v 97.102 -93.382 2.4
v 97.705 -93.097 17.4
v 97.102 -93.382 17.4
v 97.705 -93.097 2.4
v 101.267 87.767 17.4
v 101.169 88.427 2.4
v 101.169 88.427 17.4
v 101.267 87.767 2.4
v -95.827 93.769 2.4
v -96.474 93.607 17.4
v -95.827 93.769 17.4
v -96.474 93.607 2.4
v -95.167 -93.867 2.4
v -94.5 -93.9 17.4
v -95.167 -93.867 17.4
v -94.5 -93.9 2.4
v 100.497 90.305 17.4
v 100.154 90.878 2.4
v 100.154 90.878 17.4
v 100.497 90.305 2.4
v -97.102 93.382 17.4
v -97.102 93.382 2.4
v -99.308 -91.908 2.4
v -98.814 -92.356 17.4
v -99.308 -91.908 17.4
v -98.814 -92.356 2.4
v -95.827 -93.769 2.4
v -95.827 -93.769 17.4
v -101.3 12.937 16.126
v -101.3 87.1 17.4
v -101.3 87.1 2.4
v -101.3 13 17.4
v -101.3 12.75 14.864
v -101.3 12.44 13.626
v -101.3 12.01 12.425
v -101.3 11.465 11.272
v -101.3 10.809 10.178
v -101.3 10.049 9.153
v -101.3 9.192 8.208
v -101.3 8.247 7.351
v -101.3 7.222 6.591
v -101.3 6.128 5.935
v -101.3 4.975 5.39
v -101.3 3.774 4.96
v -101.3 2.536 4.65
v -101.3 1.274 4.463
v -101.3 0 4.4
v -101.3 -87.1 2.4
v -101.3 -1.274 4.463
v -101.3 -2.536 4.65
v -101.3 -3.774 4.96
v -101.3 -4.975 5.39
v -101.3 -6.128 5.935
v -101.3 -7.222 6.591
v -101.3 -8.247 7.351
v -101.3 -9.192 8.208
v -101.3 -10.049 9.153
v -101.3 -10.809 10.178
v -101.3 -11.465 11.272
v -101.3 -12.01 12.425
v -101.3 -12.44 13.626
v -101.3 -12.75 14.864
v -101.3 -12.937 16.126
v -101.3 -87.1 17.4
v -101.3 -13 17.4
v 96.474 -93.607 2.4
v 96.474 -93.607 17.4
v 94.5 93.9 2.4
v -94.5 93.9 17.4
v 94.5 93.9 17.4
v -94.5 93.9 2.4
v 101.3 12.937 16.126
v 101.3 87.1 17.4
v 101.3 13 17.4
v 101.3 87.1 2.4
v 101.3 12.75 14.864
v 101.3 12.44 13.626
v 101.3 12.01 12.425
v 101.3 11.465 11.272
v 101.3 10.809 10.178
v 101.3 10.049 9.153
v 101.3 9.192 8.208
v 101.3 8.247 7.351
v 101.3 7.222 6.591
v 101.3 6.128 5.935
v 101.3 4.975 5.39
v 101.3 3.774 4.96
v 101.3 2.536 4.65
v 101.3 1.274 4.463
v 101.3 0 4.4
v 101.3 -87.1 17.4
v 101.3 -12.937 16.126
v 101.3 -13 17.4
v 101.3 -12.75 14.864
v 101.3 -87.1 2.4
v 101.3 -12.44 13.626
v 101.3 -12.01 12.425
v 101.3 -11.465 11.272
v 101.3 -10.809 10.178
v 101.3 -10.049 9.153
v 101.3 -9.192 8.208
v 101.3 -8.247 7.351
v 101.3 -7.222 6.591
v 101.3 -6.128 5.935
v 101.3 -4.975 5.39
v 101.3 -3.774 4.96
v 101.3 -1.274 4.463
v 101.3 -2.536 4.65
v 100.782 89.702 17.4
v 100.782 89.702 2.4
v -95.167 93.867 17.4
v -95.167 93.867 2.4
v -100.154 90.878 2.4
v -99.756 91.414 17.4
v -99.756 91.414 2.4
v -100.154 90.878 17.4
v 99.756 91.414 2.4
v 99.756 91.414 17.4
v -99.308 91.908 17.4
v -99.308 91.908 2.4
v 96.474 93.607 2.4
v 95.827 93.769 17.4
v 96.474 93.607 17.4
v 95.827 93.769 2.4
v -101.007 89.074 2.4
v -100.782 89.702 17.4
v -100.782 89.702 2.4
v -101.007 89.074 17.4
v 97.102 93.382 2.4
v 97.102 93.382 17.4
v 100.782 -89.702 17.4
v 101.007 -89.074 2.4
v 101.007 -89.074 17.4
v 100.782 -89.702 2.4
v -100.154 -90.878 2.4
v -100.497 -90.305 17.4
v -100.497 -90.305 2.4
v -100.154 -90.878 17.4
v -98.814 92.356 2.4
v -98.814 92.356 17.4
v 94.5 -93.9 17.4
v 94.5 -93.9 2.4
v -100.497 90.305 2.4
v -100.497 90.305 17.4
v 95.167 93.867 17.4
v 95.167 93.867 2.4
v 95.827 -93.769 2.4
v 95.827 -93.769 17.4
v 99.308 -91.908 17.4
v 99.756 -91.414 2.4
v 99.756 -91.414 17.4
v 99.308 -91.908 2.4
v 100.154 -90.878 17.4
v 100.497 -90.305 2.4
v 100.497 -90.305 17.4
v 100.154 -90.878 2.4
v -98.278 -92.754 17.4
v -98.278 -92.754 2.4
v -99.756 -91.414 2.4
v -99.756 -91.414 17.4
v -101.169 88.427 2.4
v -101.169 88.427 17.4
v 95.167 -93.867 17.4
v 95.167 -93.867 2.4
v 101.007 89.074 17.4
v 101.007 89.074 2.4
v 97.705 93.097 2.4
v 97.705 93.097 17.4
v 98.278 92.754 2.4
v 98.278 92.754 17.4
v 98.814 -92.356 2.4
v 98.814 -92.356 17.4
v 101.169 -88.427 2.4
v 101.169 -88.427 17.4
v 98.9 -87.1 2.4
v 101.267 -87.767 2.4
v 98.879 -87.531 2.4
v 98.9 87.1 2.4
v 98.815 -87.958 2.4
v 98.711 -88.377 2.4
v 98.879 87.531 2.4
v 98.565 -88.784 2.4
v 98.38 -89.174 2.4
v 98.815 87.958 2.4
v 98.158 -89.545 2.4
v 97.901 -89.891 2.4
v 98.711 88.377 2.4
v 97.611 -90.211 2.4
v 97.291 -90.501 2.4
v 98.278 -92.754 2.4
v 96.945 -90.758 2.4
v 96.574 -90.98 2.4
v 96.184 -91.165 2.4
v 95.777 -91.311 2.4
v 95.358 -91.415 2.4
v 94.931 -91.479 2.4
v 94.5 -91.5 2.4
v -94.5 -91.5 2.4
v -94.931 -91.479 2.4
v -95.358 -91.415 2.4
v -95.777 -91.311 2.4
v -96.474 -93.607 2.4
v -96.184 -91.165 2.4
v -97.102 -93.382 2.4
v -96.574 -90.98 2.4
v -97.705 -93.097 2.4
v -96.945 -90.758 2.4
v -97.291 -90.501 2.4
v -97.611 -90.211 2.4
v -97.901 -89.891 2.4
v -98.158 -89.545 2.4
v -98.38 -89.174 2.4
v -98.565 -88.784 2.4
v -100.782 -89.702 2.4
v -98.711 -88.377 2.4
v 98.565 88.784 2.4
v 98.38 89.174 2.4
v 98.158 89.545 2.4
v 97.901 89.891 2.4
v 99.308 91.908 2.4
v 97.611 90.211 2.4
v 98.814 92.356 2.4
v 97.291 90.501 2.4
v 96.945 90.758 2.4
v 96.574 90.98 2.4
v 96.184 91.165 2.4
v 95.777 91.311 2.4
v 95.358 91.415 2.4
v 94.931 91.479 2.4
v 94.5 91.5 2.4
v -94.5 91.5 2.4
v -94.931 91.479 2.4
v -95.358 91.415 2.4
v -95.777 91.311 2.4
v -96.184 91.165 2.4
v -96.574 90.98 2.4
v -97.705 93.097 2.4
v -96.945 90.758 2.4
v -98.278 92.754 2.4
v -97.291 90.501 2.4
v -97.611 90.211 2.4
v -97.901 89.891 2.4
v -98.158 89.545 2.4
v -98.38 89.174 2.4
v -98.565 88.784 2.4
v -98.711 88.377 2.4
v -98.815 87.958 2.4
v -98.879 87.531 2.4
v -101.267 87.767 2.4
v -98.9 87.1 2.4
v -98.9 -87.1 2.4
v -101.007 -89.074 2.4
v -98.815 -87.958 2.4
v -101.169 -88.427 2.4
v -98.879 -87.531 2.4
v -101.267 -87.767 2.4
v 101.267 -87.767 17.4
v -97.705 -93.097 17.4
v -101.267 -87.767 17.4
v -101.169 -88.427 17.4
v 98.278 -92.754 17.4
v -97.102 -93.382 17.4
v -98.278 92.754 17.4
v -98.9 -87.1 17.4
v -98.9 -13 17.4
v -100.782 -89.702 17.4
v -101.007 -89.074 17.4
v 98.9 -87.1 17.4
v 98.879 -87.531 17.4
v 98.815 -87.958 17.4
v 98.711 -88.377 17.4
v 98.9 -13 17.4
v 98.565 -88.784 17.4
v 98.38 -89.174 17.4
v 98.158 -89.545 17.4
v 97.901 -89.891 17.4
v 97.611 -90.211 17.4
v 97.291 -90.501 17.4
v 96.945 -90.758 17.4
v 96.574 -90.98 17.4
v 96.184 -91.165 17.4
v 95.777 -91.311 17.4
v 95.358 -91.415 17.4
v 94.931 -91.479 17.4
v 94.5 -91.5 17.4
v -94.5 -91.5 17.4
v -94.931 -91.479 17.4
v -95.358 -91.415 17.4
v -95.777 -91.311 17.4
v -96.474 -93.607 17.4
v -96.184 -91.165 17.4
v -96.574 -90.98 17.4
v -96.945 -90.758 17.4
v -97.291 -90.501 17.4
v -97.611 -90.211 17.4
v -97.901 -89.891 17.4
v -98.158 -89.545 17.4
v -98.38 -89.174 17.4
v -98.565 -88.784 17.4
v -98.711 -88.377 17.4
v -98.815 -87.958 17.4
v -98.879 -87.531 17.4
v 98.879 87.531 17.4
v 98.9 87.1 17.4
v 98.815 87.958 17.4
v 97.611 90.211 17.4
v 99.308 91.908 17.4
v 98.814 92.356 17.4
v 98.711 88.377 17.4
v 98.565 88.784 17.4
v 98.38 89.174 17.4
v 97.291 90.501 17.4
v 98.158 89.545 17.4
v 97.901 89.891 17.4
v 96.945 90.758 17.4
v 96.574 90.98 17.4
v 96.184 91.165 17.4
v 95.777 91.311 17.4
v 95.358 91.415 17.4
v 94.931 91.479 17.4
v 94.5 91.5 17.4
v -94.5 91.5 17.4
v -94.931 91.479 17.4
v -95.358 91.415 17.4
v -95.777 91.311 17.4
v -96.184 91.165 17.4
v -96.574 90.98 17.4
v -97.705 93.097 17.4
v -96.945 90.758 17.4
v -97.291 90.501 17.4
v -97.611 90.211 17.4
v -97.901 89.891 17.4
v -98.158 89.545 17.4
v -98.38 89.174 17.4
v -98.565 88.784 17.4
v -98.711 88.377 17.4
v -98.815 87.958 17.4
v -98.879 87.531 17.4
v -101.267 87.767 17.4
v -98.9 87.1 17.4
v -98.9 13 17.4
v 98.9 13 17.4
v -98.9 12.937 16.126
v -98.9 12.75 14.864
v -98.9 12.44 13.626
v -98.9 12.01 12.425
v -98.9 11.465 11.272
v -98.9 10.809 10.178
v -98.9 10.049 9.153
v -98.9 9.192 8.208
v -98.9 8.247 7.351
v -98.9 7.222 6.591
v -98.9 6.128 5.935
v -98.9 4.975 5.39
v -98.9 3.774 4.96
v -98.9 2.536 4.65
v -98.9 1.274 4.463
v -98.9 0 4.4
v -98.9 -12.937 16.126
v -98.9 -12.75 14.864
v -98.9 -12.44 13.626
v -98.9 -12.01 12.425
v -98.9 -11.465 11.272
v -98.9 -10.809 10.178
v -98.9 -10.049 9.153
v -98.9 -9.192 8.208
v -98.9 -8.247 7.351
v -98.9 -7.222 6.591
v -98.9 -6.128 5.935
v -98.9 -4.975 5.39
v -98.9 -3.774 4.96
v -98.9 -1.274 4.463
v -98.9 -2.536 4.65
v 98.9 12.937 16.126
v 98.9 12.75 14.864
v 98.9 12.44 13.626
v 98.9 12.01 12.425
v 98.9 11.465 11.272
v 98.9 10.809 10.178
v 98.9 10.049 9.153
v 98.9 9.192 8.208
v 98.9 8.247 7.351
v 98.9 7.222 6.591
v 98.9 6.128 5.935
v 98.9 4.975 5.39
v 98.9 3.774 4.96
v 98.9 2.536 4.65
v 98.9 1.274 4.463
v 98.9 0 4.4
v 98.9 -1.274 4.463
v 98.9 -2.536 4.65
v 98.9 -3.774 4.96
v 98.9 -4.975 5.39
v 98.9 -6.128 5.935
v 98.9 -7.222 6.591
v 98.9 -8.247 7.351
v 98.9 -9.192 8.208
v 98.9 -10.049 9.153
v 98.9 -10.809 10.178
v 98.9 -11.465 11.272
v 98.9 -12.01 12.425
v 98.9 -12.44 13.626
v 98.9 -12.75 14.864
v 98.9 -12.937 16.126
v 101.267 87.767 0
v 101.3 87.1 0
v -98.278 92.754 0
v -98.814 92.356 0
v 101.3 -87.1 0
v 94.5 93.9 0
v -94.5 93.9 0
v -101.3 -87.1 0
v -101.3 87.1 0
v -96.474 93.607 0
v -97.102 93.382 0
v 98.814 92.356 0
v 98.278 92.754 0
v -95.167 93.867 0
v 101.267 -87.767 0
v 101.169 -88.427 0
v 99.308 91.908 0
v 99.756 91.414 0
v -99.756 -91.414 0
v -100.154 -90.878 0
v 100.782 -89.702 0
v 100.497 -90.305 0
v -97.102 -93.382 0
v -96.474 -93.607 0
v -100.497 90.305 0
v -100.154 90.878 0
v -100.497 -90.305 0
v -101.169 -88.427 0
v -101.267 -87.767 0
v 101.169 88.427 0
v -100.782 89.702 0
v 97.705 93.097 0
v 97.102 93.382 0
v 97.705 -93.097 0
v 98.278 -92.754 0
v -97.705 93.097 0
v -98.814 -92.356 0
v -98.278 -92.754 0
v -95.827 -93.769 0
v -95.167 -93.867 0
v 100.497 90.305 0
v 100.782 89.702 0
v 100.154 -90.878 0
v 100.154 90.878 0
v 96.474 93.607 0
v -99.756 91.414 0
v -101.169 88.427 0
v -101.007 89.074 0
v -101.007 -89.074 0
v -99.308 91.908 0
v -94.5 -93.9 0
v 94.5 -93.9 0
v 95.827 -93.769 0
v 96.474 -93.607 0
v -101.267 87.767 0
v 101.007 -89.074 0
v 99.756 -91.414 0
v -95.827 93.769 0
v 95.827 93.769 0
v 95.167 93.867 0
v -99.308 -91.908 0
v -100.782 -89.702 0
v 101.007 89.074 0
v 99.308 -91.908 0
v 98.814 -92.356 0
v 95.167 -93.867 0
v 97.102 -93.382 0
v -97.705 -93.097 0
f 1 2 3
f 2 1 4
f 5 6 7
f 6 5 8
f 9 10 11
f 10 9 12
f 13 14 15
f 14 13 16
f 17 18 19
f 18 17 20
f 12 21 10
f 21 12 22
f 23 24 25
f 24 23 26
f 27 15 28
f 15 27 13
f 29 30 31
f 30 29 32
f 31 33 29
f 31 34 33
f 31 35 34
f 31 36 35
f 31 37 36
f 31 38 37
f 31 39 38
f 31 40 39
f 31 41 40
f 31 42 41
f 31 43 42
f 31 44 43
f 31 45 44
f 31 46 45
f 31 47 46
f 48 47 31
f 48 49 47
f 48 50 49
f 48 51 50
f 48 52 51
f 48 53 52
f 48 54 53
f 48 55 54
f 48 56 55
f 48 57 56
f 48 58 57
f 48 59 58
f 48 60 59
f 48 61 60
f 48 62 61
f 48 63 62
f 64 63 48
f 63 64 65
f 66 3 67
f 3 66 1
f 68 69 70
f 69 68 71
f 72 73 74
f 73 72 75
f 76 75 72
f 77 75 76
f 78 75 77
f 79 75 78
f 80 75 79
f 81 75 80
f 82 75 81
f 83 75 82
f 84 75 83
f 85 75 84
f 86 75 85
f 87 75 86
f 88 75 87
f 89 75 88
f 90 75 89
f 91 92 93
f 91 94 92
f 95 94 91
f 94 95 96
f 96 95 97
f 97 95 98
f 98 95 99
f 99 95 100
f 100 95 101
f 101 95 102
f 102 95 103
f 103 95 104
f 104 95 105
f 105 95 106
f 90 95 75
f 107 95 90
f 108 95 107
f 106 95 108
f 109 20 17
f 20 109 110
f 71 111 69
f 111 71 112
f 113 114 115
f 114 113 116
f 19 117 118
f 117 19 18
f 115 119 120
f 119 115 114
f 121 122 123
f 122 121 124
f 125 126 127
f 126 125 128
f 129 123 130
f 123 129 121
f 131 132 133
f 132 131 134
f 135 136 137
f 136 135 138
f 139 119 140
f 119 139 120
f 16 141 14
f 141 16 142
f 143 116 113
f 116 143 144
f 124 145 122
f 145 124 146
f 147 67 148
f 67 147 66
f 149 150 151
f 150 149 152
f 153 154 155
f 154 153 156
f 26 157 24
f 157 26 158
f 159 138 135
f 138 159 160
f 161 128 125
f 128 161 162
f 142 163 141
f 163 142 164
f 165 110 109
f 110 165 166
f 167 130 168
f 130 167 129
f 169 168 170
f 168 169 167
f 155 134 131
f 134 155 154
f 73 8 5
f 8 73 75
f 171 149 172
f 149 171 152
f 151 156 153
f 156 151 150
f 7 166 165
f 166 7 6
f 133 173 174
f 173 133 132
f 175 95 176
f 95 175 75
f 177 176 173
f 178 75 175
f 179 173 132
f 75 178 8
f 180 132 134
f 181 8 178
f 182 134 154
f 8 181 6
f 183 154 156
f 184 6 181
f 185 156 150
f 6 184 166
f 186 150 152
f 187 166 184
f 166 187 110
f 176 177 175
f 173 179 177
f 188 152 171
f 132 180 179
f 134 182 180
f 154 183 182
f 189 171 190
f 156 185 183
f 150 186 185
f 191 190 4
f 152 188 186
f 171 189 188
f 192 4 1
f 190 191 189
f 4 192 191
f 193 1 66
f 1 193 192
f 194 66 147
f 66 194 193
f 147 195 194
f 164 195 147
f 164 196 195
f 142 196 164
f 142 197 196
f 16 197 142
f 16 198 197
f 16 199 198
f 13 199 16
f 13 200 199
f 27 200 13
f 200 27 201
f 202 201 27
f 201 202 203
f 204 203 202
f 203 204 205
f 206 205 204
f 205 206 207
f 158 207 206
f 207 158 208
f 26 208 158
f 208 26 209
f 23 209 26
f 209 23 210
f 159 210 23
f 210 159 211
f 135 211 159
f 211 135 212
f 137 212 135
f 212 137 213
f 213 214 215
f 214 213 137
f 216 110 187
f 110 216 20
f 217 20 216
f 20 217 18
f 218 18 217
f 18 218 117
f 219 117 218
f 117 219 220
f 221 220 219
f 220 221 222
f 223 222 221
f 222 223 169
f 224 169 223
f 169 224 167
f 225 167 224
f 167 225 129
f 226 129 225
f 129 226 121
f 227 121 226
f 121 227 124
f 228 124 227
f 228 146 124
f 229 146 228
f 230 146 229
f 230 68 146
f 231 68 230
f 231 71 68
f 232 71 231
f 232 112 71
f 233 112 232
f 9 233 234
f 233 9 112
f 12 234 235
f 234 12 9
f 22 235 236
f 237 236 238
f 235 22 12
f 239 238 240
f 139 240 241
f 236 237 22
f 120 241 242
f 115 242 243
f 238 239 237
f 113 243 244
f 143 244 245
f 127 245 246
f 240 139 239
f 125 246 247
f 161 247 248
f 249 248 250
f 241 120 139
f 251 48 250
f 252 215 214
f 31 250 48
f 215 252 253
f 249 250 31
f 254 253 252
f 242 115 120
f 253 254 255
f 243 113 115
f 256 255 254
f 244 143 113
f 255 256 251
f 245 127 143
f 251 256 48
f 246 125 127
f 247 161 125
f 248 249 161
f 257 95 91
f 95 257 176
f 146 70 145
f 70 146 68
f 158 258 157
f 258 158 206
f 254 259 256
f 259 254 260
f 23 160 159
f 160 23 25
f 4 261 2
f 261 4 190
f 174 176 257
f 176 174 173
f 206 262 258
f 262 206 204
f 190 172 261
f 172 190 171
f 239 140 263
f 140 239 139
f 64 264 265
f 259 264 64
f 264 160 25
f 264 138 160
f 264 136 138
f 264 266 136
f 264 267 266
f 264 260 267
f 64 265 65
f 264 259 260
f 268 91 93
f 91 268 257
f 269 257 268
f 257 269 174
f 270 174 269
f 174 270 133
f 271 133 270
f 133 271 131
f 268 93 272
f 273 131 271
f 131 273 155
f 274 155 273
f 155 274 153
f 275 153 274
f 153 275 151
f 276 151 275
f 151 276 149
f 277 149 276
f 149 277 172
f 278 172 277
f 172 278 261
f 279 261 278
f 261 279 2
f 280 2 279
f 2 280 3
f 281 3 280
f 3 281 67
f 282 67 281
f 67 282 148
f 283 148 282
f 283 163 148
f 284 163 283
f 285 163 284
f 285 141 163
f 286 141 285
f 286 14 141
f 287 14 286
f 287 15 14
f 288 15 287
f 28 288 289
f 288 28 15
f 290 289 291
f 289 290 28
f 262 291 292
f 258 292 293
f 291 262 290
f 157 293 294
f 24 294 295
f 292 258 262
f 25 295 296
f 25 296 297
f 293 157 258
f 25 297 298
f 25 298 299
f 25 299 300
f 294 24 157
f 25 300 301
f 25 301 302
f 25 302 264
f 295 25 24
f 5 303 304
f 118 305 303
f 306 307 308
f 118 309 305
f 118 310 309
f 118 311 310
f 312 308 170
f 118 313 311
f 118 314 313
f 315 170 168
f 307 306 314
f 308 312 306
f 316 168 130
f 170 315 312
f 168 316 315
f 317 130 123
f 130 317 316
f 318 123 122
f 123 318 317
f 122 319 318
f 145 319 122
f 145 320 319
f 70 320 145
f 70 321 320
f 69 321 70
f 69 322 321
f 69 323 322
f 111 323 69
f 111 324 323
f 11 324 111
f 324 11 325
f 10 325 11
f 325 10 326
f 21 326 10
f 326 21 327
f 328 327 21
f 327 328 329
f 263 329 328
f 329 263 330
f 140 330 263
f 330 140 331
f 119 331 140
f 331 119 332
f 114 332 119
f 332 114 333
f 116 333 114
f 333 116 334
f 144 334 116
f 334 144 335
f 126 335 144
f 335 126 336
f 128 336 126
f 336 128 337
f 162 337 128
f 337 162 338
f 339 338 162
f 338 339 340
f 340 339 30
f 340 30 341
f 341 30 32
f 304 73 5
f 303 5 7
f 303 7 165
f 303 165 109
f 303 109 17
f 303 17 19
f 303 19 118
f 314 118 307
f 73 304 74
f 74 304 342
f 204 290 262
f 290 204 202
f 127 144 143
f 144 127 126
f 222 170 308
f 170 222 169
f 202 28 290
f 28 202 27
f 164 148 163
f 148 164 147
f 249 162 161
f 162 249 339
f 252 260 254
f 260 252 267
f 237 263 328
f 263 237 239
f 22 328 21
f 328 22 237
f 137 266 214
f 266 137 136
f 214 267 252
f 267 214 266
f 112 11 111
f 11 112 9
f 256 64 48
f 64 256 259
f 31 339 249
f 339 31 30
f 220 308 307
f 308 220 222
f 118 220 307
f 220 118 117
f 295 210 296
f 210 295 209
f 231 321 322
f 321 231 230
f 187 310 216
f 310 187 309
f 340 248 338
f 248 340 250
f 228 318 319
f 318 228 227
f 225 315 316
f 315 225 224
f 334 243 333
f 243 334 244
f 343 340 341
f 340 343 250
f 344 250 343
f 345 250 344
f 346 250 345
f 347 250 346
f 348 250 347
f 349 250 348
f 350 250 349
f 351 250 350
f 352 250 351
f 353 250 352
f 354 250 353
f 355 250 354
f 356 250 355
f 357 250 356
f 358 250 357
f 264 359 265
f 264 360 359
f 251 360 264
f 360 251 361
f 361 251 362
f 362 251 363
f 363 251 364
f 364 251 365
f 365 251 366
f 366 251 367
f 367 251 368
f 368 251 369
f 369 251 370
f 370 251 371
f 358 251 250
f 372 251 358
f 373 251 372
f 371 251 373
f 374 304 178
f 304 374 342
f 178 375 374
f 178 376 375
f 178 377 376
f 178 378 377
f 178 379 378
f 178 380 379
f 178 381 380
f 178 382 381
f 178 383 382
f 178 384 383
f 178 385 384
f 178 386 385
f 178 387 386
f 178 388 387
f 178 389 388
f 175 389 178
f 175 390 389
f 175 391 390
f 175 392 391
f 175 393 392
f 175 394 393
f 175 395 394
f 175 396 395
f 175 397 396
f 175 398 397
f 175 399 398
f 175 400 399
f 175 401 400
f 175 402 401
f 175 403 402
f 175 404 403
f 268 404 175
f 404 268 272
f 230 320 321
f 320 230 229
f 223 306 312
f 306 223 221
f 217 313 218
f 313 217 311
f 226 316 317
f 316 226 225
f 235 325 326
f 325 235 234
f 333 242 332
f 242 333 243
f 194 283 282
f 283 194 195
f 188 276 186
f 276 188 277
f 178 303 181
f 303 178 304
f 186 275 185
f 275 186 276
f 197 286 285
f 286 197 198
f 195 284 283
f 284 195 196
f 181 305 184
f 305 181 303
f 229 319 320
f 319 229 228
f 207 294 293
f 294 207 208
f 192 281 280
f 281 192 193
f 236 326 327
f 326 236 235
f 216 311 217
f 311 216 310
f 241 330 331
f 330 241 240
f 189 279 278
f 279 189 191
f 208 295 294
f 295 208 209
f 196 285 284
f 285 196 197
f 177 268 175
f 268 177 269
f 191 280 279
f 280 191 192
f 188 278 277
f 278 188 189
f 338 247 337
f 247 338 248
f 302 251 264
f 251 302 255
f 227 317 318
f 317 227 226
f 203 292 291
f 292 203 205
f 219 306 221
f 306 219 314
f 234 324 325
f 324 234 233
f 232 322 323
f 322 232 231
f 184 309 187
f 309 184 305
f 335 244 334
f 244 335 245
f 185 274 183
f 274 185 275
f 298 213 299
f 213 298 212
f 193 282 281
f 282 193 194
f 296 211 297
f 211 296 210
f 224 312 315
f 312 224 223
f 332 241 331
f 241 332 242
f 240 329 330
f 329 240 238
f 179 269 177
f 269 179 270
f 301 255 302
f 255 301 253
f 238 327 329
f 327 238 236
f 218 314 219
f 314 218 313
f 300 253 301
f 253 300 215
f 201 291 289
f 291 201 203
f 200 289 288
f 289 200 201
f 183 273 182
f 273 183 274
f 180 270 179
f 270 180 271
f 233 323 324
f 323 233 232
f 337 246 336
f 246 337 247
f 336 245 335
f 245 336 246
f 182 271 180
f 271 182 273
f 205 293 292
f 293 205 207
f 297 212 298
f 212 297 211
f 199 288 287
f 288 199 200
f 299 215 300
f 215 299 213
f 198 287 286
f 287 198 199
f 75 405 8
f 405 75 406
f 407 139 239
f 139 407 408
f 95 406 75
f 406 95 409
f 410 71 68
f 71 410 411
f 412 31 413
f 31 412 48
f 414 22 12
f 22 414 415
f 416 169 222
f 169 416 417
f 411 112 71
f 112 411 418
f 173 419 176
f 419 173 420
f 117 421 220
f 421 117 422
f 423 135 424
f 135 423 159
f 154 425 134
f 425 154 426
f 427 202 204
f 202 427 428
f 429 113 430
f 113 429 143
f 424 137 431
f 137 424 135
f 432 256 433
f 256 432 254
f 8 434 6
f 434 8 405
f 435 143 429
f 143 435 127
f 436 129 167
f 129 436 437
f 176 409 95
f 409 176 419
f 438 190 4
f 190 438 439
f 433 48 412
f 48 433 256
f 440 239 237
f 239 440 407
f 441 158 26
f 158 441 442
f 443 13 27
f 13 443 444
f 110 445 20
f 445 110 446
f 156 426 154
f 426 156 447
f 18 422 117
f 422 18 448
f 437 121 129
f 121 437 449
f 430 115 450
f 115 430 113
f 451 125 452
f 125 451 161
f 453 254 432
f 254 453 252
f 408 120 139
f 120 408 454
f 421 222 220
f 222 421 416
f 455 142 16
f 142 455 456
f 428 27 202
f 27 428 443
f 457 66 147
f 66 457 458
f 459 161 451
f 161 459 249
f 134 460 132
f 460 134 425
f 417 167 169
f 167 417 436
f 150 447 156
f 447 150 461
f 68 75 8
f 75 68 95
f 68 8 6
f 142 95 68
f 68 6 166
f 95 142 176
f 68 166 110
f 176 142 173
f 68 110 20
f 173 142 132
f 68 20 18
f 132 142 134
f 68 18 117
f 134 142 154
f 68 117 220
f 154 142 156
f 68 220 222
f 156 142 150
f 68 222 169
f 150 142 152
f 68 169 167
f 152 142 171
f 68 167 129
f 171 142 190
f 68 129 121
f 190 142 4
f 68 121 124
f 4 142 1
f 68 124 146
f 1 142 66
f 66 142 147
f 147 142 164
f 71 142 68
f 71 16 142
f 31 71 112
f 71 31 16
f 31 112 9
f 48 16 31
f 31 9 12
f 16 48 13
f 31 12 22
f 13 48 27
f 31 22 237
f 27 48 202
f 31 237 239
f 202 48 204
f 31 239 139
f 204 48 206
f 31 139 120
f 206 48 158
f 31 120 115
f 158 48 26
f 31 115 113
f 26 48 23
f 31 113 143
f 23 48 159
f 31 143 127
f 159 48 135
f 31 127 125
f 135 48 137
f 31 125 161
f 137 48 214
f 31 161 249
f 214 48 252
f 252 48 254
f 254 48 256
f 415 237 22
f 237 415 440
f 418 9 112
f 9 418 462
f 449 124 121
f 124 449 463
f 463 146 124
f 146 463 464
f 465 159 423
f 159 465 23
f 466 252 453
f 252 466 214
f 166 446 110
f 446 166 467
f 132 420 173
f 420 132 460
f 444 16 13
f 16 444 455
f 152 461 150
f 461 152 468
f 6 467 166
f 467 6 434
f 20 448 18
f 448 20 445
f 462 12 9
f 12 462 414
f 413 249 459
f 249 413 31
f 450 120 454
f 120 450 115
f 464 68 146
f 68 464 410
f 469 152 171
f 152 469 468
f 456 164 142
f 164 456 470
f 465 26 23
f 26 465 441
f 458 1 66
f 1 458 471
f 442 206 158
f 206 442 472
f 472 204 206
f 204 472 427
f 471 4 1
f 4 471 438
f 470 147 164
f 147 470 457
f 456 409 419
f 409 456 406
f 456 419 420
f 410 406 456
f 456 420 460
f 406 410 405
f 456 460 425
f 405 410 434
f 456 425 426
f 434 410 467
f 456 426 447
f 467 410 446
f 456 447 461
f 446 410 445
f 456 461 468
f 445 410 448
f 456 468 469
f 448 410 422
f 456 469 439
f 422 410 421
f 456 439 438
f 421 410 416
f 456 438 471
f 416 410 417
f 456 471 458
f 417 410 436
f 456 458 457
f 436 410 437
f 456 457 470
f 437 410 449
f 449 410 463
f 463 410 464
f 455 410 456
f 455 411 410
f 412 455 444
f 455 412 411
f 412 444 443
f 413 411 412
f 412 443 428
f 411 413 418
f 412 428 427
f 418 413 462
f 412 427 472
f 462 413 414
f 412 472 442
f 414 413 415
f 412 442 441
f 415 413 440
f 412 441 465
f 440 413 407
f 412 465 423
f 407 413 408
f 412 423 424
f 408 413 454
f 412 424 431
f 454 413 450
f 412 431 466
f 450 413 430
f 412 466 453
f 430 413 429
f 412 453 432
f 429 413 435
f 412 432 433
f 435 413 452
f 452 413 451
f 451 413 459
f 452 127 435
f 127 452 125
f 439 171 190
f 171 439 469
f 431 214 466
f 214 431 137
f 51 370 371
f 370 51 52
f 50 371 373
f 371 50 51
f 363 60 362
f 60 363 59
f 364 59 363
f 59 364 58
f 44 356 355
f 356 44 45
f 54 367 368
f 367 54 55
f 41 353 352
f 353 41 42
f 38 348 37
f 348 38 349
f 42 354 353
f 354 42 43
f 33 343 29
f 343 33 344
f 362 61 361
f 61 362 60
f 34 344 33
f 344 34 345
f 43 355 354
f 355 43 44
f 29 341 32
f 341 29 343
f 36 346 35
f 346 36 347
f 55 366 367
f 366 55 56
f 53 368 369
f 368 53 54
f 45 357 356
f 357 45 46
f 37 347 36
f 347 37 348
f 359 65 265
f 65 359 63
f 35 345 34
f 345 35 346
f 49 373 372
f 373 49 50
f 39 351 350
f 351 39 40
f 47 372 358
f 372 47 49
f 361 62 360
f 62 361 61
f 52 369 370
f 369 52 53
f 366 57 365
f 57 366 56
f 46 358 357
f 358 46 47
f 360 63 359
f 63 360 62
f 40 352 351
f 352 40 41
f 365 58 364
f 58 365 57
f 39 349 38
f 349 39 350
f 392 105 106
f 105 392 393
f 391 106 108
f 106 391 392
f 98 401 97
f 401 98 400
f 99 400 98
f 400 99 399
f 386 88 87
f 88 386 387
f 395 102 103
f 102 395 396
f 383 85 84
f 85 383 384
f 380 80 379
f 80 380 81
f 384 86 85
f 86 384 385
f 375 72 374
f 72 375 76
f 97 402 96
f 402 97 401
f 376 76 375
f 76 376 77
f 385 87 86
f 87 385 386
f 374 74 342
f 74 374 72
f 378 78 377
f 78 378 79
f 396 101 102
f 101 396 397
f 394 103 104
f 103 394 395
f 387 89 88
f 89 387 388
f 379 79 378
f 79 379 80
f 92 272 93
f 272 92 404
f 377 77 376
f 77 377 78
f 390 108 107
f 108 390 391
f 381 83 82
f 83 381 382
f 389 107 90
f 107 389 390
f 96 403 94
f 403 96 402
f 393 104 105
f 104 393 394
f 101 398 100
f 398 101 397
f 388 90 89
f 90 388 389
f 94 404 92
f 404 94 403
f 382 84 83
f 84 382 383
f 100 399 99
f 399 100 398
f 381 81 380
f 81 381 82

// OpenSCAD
// file: ../scad/vial_vault.scad
// vial_vault.scad -- parametric dark-storage vial holder (tray + lift-off lid)
// Geometry variables + POCKETS list are supplied by build/<D>_geom.scad.
// PART is set by the wrapper (build/<D>_tray.scad / _lid.scad). NEVER re-assign PART here.
$fn = 64;

part_sel = is_undef(PART) ? "tray" : PART;   // read-only selector (see memory gotcha)

// ---- rounded rectangular prism, centred in XY, z=0..h ----
module rrect(sx, sy, h, r) {
    r = min(r, sx/2, sy/2);
    hull() for (dx = [r - sx/2, sx/2 - r], dy = [r - sy/2, sy/2 - r])
        translate([dx, dy, 0]) cylinder(r = r, h = h);
}

// ---- one pocket tube: solid cylinder w/ bored vial cavity from top ----
module pocket(p) {
    x = p[0]; y = p[1]; bore = p[2]; depth = p[3]; small = p[4];
    scal = len(p) > 5 ? p[5] : 0;
    tube_od = bore + 2 * PWALL;
    translate([x, y, BASE_T]) {
        difference() {
            cylinder(d = tube_od, h = TUBE_H);
            // vial cavity: bored from the tube top down by `depth`
            translate([0, 0, TUBE_H - depth])
                cylinder(d = bore, h = depth + 0.1);
            // lead-in chamfer at the bore mouth: funnels the vial in on the drop
            translate([0, 0, TUBE_H - 1.6])
                cylinder(d1 = bore, d2 = bore + 2.4, h = 1.7);
            // finger scallop on small pockets: side notch from rim down ~18mm,
            // pointed toward the box centre (never faces the perimeter wall)
            if (FINGER_SCALLOP && small == 1)
                rotate([0, 0, scal])
                    translate([tube_od/2 - 1.5, 0, TUBE_H - 18])
                        cylinder(d = bore * 0.55, h = 20);
        }
    }
}

module all_pockets() {
    for (p = POCKETS) pocket(p);
}

// ---- hand slots cut through the two short (X-facing) end walls ----
module hand_slots() {
    sw = 60; sh = 16; zc = RIM_H - 14;
    for (sx = [-1, 1])
        translate([sx * (OUTER_W/2), 0, zc]) rotate([90, 0, 90])
            linear_extrude(height = WALL * 4, center = true)
                offset(r = sh/2) square([sw - sh, 0.01], center = true);
}

module tray() {
    difference() {
        union() {
            // base slab (with a bottom outer chamfer for clean first-layer adhesion)
            hull() {
                translate([0, 0, 0.8])
                    rrect(OUTER_W, OUTER_L, BASE_T - 0.8, CORNER_R);
                rrect(OUTER_W - 1.6, OUTER_L - 1.6, 0.6, CORNER_R);
            }
            // perimeter wall (hollow frame)
            difference() {
                rrect(OUTER_W, OUTER_L, RIM_H, CORNER_R);
                translate([0, 0, BASE_T])
                    rrect(OUTER_W - 2*WALL, OUTER_L - 2*WALL, RIM_H, max(0.5, CORNER_R - WALL));
            }
            // pocket tubes
            all_pockets();
        }
        if (HAND_SLOTS) hand_slots();
    }
}

module lid() {
    lw = OUTER_W + 2 * (LID_GAP + SKIRT_W);
    ll = OUTER_L + 2 * (LID_GAP + SKIRT_W);
    lr = CORNER_R + LID_GAP + SKIRT_W;
    // printed roof-down: roof plate at z=0, skirt rising in +z
    difference() {
        union() {
            rrect(lw, ll, ROOF_T, lr);                      // roof
            translate([0, 0, ROOF_T])
                difference() {                              // skirt wall
                    rrect(lw, ll, SKIRT_H, lr);
                    translate([0, 0, -0.1])
                        rrect(OUTER_W + 2*LID_GAP, OUTER_L + 2*LID_GAP, SKIRT_H + 0.2,
                              CORNER_R + LID_GAP);
                }
        }
        // finger-pull scallops on both short (X) ends of the skirt for easy lift-off
        for (sx = [-1, 1])
            translate([sx * lw/2, 0, ROOF_T + SKIRT_H])
                scale([1, 1, 1]) rotate([90, 0, 90])
                    cylinder(d = 26, h = SKIRT_W * 4, center = true);
    }
}

// ---- fit-audit cutaway: tray sliced at y=0 with reference vials at rest height ----
module ghost_vials() {
    for (p = POCKETS) {
        x = p[0]; y = p[1]; bore = p[2]; depth = p[3];
        vial_od = bore - 3;                 // nominal vial OD (bore minus clearance)
        vial_h  = depth - 2;                // nominal vial height (depth minus bore-gap)
        rest_z  = BASE_T + (TUBE_H - depth); // pedestal top the vial sits on
        translate([x, y, rest_z]) cylinder(d = max(2, vial_od), h = vial_h);
    }
}

module section() {
    difference() {
        union() {
            tray();
            // reference vials shown translucent-ish (own color) to check seating
            color([0.85, 0.2, 0.2]) ghost_vials();
        }
        // cut away the +Y half to expose the interior
        translate([-(OUTER_W + 40)/2, 0, -1])
            cube([OUTER_W + 40, OUTER_L + 40, RIM_H + 40]);
    }
}

if (part_sel == "tray") tray();
else if (part_sel == "lid") lid();
else if (part_sel == "section") section();
else { tray(); }
// file: C_geom.scad
// AUTO-GENERATED by layout.py for design C. Do not edit by hand.
DESIGN = "C";
OUTER_W = 197.0;
OUTER_L = 182.2;
RIM_H = 95.0;
TUBE_H = 84.0;
BASE_T = 3.0;
WALL = 3.0;
PWALL = 2.0;
CORNER_R = 4.0;
LID_GAP = 0.4;
SKIRT_W = 2.4;
SKIRT_H = 15.0;
ROOF_T = 2.4;
HAND_SLOTS = true;
FINGER_SCALLOP = true;
POCKETS = [
  [-40.6, -64.1, 36.0, 80.0, 0, 57.7],
  [0.0, -64.1, 36.0, 80.0, 0, 90.0],
  [40.6, -64.1, 36.0, 80.0, 0, 122.3],
  [-76.5, -24.1, 26.0, 57.0, 0, 17.5],
  [-45.9, -24.1, 26.0, 57.0, 0, 27.7],
  [-15.3, -24.1, 26.0, 57.0, 0, 57.6],
  [15.3, -24.1, 26.0, 57.0, 0, 122.4],
  [45.9, -24.1, 26.0, 57.0, 0, 152.3],
  [76.5, -24.1, 26.0, 57.0, 0, 162.5],
  [-9.3, 4.9, 14.0, 67.0, 1, -27.8],
  [9.3, 4.9, 14.0, 67.0, 1, -152.2],
  [-9.3, 23.5, 14.0, 67.0, 1, -68.4],
  [9.3, 23.5, 14.0, 67.0, 1, -111.6],
  [-59.0, 49.0, 19.0, 47.0, 1, -39.7],
  [-35.4, 49.0, 19.0, 47.0, 1, -54.2],
  [-11.8, 49.0, 19.0, 47.0, 1, -76.5],
  [11.8, 49.0, 19.0, 47.0, 1, -103.5],
  [35.4, 49.0, 19.0, 47.0, 1, -125.8],
  [59.0, 49.0, 19.0, 47.0, 1, -140.3],
  [-59.0, 72.6, 19.0, 47.0, 1, -50.9],
  [-35.4, 72.6, 19.0, 47.0, 1, -64.0],
  [-11.8, 72.6, 19.0, 47.0, 1, -80.8],
  [11.8, 72.6, 19.0, 47.0, 1, -99.2],
  [35.4, 72.6, 19.0, 47.0, 1, -116.0],
  [59.0, 72.6, 19.0, 47.0, 1, -129.1],
];
// main file
PART = "lid";
include <C_geom.scad>
include <../scad/vial_vault.scad>
